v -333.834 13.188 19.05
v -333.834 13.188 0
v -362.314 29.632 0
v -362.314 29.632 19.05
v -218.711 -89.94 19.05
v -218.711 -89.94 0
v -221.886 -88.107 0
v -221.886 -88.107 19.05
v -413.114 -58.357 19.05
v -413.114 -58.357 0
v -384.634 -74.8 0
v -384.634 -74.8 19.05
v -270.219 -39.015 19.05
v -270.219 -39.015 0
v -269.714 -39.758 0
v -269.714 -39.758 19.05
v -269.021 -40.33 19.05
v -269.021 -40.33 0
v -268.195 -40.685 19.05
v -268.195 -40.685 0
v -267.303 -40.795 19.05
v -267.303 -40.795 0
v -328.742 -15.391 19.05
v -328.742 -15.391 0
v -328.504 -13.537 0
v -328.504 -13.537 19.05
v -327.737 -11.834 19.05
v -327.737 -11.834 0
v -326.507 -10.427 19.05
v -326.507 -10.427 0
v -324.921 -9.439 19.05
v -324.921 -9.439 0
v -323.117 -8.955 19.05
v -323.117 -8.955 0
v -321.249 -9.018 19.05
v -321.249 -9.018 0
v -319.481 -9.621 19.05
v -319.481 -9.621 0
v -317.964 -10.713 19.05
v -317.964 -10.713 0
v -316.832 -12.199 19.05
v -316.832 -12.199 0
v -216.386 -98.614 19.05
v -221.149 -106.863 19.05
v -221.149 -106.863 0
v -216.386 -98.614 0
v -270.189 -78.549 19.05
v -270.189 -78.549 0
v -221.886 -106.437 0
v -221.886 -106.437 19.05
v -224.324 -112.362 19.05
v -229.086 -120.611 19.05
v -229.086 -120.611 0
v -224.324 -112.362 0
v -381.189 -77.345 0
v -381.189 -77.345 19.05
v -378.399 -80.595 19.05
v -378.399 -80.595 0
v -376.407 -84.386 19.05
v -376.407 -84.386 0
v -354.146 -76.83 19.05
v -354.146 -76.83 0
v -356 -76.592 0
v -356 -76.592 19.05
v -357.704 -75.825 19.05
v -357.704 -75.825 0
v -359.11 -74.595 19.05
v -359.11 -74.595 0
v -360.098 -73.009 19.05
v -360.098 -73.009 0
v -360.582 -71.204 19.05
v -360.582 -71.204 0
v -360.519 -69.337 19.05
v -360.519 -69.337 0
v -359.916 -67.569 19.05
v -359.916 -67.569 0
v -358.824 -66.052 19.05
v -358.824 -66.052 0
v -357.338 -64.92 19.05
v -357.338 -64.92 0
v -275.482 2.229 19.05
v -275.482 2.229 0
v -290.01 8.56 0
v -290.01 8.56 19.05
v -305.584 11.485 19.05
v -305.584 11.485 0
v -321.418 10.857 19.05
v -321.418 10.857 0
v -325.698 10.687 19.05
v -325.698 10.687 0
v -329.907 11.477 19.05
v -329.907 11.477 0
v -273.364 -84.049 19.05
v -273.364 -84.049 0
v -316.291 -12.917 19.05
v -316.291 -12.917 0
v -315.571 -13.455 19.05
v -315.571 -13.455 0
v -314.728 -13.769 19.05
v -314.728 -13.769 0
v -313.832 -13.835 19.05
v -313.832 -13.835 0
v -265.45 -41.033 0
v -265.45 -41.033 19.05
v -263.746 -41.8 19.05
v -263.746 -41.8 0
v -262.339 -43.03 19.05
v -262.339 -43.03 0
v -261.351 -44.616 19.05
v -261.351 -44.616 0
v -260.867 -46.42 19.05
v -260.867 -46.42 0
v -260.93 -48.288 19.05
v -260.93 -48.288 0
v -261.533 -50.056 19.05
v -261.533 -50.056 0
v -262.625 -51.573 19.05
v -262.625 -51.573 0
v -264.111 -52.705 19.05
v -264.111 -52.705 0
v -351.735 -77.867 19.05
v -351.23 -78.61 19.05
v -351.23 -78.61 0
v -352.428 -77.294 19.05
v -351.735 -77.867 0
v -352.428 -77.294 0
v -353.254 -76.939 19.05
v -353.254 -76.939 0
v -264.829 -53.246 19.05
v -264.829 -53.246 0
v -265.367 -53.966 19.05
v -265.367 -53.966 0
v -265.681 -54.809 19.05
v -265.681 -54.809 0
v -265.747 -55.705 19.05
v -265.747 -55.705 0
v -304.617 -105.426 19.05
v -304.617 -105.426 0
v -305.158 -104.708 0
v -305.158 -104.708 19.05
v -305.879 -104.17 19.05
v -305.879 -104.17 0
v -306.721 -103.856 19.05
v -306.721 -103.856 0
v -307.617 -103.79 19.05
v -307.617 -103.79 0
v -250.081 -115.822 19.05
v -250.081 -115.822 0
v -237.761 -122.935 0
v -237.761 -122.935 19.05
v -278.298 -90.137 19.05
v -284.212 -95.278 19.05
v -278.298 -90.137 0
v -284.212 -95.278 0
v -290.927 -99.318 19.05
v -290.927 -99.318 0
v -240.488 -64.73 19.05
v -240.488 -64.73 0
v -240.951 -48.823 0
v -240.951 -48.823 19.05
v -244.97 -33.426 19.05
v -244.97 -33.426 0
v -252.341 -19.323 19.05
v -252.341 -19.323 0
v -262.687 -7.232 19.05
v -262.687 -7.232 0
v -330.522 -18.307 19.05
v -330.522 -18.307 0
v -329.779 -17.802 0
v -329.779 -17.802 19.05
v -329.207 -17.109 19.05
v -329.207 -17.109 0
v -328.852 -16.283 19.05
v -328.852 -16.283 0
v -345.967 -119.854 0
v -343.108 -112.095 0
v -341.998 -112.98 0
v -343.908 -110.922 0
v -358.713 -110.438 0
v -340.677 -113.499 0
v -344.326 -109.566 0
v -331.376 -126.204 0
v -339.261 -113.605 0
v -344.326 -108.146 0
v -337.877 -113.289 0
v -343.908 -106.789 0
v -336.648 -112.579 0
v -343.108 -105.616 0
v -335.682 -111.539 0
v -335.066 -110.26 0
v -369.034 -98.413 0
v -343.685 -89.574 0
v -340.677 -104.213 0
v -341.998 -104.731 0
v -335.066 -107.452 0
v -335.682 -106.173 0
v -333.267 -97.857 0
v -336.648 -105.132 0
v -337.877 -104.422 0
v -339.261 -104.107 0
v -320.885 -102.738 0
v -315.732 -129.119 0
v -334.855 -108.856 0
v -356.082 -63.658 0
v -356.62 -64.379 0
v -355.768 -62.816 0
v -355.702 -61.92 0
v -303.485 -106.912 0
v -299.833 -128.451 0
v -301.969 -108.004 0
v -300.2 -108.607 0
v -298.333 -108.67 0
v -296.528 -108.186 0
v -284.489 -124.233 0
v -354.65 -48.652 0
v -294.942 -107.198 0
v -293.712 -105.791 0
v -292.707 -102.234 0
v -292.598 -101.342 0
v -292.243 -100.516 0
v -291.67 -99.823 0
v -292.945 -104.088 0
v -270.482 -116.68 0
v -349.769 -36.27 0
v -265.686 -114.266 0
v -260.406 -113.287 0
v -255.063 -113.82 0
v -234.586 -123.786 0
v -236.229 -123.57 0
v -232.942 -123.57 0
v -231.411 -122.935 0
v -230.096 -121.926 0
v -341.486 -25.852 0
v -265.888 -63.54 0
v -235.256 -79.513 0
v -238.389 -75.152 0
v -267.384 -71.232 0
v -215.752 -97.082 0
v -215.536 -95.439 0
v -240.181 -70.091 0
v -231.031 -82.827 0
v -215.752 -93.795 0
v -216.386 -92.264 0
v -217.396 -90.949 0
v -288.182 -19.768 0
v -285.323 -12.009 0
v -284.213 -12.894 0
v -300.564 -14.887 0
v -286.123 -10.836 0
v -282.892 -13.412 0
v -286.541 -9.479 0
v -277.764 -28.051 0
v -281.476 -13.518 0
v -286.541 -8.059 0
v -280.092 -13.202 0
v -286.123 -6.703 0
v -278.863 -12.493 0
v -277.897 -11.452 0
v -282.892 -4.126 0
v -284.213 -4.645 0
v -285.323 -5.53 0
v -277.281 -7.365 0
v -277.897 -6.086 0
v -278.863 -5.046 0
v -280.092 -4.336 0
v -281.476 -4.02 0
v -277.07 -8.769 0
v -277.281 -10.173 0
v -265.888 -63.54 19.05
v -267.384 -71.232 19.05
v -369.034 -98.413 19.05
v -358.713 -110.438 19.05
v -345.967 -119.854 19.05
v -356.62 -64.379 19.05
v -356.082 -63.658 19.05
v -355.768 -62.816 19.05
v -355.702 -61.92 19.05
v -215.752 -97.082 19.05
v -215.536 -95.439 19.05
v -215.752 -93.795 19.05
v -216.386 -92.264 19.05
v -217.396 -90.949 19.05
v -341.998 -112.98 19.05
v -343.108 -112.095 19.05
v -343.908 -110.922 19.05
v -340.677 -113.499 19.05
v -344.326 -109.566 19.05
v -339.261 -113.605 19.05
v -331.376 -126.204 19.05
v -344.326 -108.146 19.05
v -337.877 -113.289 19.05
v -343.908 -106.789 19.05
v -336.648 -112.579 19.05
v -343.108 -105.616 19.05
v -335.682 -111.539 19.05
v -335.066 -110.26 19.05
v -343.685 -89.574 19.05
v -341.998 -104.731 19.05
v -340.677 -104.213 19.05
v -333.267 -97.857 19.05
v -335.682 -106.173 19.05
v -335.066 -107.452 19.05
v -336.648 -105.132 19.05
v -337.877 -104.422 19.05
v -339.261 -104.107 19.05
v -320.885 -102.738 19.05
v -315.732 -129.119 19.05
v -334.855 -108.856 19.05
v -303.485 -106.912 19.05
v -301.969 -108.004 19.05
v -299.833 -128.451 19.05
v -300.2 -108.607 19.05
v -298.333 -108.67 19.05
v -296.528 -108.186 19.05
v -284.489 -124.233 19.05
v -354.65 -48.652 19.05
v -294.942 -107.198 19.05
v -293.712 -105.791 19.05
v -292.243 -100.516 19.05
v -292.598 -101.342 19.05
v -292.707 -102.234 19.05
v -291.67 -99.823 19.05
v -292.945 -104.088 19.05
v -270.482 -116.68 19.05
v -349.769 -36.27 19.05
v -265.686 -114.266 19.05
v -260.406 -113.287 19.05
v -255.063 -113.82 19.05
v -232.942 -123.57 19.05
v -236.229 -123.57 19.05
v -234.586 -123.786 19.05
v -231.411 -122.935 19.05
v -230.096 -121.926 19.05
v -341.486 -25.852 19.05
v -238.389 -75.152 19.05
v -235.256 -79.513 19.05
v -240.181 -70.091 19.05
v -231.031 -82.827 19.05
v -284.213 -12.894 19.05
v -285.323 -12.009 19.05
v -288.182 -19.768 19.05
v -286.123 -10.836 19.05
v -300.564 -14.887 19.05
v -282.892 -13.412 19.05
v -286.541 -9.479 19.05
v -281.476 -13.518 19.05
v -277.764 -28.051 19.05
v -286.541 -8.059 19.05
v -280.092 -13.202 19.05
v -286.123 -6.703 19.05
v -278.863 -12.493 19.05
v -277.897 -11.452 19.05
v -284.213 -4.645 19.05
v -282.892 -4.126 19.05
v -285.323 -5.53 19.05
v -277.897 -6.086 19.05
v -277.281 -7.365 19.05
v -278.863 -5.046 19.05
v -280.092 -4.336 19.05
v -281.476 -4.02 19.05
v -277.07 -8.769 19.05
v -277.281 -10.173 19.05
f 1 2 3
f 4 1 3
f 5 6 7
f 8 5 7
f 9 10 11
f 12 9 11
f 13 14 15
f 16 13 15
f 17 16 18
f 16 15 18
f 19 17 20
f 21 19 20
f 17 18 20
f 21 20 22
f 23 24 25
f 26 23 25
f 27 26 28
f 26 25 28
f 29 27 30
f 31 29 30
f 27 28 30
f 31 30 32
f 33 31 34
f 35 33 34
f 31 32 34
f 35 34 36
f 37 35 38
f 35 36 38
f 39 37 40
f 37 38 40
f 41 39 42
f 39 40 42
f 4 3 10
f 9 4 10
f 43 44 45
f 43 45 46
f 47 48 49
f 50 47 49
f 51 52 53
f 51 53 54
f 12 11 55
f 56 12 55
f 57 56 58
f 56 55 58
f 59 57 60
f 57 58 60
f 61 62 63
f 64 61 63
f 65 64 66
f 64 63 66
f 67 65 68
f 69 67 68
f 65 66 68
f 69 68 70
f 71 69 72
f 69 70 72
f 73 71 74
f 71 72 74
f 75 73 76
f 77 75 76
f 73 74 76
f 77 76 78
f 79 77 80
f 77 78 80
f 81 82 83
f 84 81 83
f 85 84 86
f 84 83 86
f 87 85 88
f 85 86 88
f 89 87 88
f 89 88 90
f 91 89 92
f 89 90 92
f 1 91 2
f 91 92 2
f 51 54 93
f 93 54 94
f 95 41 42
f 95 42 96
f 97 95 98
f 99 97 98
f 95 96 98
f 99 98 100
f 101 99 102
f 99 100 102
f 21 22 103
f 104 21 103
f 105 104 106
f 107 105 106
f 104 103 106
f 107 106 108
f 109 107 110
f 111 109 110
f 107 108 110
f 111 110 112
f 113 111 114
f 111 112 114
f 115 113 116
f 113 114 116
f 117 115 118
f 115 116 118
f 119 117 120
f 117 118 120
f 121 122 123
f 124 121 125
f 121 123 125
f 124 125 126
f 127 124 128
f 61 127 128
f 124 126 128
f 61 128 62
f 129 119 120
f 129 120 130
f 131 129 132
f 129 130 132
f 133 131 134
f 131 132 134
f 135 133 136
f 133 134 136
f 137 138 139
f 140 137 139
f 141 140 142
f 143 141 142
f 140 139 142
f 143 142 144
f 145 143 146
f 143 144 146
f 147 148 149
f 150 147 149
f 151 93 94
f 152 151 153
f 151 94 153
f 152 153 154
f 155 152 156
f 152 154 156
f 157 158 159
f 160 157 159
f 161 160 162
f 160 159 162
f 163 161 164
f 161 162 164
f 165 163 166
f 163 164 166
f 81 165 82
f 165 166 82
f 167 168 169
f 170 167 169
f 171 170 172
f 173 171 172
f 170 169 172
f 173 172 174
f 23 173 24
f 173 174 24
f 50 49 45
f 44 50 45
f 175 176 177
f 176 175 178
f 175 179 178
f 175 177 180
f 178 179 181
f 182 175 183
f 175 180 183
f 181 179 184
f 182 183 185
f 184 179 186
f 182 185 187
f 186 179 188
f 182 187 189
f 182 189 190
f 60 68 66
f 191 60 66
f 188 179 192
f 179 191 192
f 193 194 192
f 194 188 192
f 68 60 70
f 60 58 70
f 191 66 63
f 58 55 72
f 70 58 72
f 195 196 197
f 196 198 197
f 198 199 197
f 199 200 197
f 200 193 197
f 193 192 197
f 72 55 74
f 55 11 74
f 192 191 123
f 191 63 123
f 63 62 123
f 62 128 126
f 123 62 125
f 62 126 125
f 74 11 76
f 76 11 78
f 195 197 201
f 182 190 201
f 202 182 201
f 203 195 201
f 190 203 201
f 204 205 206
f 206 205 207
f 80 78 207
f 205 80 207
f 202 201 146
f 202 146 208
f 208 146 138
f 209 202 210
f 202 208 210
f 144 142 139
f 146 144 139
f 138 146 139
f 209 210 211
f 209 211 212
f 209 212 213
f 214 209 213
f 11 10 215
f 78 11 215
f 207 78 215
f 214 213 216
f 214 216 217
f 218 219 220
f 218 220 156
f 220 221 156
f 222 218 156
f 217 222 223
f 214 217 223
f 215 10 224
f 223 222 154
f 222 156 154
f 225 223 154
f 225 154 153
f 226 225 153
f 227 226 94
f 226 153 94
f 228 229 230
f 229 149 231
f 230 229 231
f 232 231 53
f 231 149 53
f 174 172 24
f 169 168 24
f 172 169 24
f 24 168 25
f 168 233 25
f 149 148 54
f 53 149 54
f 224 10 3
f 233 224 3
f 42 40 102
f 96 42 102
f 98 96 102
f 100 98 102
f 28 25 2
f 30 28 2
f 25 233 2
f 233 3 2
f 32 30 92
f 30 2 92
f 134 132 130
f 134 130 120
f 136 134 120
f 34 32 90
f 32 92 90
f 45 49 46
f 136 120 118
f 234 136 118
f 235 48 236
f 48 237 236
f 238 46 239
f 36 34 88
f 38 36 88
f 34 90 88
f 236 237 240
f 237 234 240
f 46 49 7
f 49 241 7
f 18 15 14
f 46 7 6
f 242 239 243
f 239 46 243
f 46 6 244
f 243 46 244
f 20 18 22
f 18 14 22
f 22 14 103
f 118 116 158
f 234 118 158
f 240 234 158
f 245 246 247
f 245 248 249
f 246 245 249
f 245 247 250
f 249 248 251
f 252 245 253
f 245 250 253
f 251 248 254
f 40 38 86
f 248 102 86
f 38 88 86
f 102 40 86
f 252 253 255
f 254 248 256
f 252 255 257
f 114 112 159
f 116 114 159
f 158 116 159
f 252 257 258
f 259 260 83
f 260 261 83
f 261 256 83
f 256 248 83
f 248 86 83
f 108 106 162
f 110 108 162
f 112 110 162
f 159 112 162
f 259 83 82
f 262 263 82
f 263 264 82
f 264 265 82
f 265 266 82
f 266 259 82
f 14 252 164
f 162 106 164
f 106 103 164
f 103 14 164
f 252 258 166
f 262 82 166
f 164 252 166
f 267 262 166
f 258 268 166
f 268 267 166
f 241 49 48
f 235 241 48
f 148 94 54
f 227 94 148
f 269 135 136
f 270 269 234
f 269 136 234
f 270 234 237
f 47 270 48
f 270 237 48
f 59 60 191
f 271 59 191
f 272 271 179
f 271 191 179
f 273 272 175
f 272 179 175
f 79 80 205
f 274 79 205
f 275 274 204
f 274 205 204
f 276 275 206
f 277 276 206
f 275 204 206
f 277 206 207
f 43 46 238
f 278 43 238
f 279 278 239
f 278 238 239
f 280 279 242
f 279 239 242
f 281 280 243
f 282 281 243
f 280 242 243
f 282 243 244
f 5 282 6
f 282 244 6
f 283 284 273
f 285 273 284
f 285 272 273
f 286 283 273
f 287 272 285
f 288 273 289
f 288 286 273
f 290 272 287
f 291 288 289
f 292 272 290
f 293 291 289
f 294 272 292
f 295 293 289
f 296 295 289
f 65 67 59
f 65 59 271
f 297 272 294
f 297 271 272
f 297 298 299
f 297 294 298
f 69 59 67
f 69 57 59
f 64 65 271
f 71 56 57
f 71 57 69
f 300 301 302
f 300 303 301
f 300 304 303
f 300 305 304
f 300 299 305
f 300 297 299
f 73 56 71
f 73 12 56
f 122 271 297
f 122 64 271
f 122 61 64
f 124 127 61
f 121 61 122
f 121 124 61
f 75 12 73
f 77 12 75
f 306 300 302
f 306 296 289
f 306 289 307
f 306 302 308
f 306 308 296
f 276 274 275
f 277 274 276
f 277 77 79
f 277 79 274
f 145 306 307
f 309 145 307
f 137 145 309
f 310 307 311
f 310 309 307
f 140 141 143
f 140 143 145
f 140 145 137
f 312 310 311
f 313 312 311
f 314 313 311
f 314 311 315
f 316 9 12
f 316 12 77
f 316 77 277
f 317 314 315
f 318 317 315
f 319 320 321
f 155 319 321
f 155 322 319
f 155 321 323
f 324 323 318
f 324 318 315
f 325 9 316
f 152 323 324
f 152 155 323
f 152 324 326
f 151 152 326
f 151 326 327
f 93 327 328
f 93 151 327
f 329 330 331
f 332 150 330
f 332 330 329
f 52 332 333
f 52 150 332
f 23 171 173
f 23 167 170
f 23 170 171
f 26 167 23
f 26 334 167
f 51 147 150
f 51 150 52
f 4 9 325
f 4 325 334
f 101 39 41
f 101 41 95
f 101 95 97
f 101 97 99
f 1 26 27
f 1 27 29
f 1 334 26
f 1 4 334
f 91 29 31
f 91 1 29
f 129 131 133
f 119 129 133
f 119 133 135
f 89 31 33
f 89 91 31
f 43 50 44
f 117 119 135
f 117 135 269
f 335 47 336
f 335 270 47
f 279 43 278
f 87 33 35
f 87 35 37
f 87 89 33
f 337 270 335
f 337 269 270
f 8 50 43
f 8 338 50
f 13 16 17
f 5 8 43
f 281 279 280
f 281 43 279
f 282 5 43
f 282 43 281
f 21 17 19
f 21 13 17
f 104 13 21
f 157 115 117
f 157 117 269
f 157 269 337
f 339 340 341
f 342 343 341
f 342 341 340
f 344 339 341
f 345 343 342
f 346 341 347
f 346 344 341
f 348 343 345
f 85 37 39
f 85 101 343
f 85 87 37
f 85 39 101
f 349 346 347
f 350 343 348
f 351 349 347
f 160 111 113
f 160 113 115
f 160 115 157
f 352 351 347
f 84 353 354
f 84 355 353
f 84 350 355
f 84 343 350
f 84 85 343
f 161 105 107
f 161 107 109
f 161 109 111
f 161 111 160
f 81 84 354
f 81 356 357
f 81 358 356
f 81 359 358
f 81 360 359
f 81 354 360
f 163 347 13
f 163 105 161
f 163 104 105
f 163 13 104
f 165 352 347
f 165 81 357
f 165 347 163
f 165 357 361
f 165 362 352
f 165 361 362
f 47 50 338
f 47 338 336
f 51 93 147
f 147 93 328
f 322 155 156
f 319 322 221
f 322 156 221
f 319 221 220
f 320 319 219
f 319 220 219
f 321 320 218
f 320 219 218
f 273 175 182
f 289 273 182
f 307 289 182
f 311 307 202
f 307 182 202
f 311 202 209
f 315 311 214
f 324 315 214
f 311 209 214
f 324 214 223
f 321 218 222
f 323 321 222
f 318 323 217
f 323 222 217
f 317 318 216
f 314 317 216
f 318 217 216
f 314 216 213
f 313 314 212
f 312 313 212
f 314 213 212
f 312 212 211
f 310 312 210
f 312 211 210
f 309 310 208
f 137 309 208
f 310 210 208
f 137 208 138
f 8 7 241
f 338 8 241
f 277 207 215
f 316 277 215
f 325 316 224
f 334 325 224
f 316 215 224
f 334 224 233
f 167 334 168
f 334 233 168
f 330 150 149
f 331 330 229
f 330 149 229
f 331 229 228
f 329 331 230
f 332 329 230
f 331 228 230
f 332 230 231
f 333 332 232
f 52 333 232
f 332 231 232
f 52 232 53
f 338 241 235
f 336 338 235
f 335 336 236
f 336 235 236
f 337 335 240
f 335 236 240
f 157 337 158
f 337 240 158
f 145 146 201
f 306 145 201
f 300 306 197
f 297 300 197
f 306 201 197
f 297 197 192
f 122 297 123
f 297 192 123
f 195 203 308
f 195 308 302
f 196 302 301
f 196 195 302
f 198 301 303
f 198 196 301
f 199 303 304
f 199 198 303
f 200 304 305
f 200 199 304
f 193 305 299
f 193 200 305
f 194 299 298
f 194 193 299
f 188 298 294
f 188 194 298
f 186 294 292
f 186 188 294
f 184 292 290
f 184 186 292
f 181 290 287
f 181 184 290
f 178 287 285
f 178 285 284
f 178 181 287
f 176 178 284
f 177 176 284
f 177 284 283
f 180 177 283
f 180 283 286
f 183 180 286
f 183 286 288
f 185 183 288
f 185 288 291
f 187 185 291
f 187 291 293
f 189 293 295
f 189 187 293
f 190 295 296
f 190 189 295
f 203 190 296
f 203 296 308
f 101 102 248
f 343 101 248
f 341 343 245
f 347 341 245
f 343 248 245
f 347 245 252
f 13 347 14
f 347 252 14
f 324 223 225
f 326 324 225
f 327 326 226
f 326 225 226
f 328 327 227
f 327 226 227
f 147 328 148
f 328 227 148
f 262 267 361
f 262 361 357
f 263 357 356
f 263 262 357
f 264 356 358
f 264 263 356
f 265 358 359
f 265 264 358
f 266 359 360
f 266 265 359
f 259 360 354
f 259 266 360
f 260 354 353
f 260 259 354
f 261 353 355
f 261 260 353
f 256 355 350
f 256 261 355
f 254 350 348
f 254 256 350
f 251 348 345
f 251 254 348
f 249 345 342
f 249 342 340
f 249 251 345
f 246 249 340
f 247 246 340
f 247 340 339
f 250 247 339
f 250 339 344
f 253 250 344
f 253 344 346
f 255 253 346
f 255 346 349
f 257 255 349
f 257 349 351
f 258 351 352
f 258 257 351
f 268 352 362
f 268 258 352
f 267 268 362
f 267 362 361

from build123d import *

# Parameters (mm, degrees)
F0_R     = 4.7625
F1_DEPTH = 19.05


# Not quite as in the source:
# - ends of sketch curves that miss each other by under 0.0002 mm in the source are joined


with BuildPart() as f1:
    # F0 (on Top) → F1 (new body)
    with BuildSketch(Plane.XY):
        with BuildLine():
            Line((-221.8857894, -106.4373771847), (-221.8857894, -88.1065191612))
            Line((-221.8857894, -88.1065191612), (-231.0306276, -82.826733))
            ThreePointArc((-231.0306276, -82.826733), (-238.3890078323, -75.1524401819), (-240.4883816501, -64.7297166236))
            ThreePointArc((-240.4883816501, -64.7297166236), (-248.2560543221, -26.1655958132), (-275.4820809487, 2.2293229893))
            ThreePointArc((-275.4820809487, 2.2293229893), (-297.7142880041, 10.461378966), (-321.4183295937, 10.8565858382))
            ThreePointArc((-321.4183295937, 10.8565858382), (-327.8248357317, 10.9634065797), (-333.8335467811, 13.1882885934))
            Line((-333.8335467811, 13.1882885934), (-362.314236, 29.6316146))
            Line((-362.314236, 29.6316146), (-413.114236, -58.3565508))
            Line((-413.114236, -58.3565508), (-384.6335462, -74.7999012))
            ThreePointArc((-384.6335462, -74.7999012), (-379.7023894379, -78.8911519852), (-376.4066376642, -84.3859370356))
            ThreePointArc((-376.4066376642, -84.3859370356), (-364.2123588019, -104.7166445735), (-345.9670808498, -119.8542782393))
            ThreePointArc((-345.9670808498, -119.8542782393), (-307.7633473097, -129.2352495129), (-270.4820087562, -116.6801838382))
            ThreePointArc((-270.4820087562, -116.6801838382), (-260.4059713642, -113.286900565), (-250.0806270189, -115.8222971934))
            Line((-250.0806270189, -115.8222971934), (-237.760637, -122.9352634))
            ThreePointArc((-237.760637, -122.9352634), (-232.9421342351, -123.569614107), (-229.0863779145, -120.6109894599))
            Line((-229.0863779145, -120.6109894599), (-224.3238846, -112.362107))
            Line((-224.3238846, -112.362107), (-273.3642488, -84.0486254))
            ThreePointArc((-273.3642488, -84.0486254), (-281.1433177605, -92.8360964437), (-290.9268252362, -99.3181139076))
            ThreePointArc((-290.9268252362, -99.3181139076), (-292.2425670349, -100.5162816603), (-292.7069827203, -102.2341617784))
            ThreePointArc((-292.7069827203, -102.2341617784), (-297.4122125633, -108.4948669165), (-304.6174116153, -105.4255515302))
            ThreePointArc((-304.6174116153, -105.4255515302), (-305.8785439427, -104.1700351993), (-307.6170882048, -103.7902477201))
            ThreePointArc((-307.6170882048, -103.7902477201), (-333.2670739258, -97.8572369807), (-351.2302185284, -78.6102104616))
            ThreePointArc((-351.2302185284, -78.6102104616), (-352.4283762603, -77.2944637651), (-354.1462563784, -76.8300480797))
            ThreePointArc((-354.1462563784, -76.8300480797), (-360.4069615165, -72.1248182367), (-357.3376461302, -64.9196191847))
            ThreePointArc((-357.3376461302, -64.9196191847), (-356.0821208015, -63.6584957522), (-355.7023440666, -61.9199427159))
            ThreePointArc((-355.7023440666, -61.9199427159), (-349.7693252458, -36.2699713018), (-330.5223050616, -18.3068376716))
            ThreePointArc((-330.5223050616, -18.3068376716), (-329.2065612709, -17.1086592996), (-328.7421426797, -15.3907744216))
            ThreePointArc((-328.7421426797, -15.3907744216), (-324.0369128367, -9.1300692835), (-316.8317137847, -12.1993846698))
            ThreePointArc((-316.8317137847, -12.1993846698), (-315.5705903522, -13.4549099985), (-313.8320373159, -13.8346867334))
            ThreePointArc((-313.8320373159, -13.8346867334), (-288.1820750251, -19.7677256868), (-270.2189422924, -39.0147306362))
            ThreePointArc((-270.2189422924, -39.0147306362), (-269.0207538996, -40.3304695291), (-267.3028690216, -40.7948881203))
            ThreePointArc((-267.3028690216, -40.7948881203), (-261.0421638835, -45.5001179633), (-264.1114792698, -52.7053170153))
            ThreePointArc((-264.1114792698, -52.7053170153), (-265.3669956007, -53.9664493427), (-265.7467830799, -55.7049936048))
            ThreePointArc((-265.7467830799, -55.7049936048), (-266.4686255378, -67.4187649457), (-270.1892527015, -78.5493711003))
            Line((-270.1892527015, -78.5493711003), (-221.8857894, -106.4373771847))
        make_face()
        with Locations((-339.6170754, -108.8557386)):
            Circle(F0_R, mode=Mode.SUBTRACT)
        with Locations((-281.8320754, -8.7691976)):
            Circle(F0_R, mode=Mode.SUBTRACT)
        with BuildLine():
            Line((-218.710637, -89.9396982), (-221.8857894, -88.1065191612))
            Line((-221.8857894, -88.1065191612), (-221.8857894, -106.4373771847))
            Line((-221.8857894, -106.4373771847), (-221.1488846, -106.8628292))
            Line((-221.1488846, -106.8628292), (-216.3863846, -98.6139506))
            ThreePointArc((-216.3863846, -98.6139506), (-215.7520068495, -93.7954539688), (-218.710637, -89.9396982))
        make_face()
    extrude(amount=F1_DEPTH)


solid = f1.part
